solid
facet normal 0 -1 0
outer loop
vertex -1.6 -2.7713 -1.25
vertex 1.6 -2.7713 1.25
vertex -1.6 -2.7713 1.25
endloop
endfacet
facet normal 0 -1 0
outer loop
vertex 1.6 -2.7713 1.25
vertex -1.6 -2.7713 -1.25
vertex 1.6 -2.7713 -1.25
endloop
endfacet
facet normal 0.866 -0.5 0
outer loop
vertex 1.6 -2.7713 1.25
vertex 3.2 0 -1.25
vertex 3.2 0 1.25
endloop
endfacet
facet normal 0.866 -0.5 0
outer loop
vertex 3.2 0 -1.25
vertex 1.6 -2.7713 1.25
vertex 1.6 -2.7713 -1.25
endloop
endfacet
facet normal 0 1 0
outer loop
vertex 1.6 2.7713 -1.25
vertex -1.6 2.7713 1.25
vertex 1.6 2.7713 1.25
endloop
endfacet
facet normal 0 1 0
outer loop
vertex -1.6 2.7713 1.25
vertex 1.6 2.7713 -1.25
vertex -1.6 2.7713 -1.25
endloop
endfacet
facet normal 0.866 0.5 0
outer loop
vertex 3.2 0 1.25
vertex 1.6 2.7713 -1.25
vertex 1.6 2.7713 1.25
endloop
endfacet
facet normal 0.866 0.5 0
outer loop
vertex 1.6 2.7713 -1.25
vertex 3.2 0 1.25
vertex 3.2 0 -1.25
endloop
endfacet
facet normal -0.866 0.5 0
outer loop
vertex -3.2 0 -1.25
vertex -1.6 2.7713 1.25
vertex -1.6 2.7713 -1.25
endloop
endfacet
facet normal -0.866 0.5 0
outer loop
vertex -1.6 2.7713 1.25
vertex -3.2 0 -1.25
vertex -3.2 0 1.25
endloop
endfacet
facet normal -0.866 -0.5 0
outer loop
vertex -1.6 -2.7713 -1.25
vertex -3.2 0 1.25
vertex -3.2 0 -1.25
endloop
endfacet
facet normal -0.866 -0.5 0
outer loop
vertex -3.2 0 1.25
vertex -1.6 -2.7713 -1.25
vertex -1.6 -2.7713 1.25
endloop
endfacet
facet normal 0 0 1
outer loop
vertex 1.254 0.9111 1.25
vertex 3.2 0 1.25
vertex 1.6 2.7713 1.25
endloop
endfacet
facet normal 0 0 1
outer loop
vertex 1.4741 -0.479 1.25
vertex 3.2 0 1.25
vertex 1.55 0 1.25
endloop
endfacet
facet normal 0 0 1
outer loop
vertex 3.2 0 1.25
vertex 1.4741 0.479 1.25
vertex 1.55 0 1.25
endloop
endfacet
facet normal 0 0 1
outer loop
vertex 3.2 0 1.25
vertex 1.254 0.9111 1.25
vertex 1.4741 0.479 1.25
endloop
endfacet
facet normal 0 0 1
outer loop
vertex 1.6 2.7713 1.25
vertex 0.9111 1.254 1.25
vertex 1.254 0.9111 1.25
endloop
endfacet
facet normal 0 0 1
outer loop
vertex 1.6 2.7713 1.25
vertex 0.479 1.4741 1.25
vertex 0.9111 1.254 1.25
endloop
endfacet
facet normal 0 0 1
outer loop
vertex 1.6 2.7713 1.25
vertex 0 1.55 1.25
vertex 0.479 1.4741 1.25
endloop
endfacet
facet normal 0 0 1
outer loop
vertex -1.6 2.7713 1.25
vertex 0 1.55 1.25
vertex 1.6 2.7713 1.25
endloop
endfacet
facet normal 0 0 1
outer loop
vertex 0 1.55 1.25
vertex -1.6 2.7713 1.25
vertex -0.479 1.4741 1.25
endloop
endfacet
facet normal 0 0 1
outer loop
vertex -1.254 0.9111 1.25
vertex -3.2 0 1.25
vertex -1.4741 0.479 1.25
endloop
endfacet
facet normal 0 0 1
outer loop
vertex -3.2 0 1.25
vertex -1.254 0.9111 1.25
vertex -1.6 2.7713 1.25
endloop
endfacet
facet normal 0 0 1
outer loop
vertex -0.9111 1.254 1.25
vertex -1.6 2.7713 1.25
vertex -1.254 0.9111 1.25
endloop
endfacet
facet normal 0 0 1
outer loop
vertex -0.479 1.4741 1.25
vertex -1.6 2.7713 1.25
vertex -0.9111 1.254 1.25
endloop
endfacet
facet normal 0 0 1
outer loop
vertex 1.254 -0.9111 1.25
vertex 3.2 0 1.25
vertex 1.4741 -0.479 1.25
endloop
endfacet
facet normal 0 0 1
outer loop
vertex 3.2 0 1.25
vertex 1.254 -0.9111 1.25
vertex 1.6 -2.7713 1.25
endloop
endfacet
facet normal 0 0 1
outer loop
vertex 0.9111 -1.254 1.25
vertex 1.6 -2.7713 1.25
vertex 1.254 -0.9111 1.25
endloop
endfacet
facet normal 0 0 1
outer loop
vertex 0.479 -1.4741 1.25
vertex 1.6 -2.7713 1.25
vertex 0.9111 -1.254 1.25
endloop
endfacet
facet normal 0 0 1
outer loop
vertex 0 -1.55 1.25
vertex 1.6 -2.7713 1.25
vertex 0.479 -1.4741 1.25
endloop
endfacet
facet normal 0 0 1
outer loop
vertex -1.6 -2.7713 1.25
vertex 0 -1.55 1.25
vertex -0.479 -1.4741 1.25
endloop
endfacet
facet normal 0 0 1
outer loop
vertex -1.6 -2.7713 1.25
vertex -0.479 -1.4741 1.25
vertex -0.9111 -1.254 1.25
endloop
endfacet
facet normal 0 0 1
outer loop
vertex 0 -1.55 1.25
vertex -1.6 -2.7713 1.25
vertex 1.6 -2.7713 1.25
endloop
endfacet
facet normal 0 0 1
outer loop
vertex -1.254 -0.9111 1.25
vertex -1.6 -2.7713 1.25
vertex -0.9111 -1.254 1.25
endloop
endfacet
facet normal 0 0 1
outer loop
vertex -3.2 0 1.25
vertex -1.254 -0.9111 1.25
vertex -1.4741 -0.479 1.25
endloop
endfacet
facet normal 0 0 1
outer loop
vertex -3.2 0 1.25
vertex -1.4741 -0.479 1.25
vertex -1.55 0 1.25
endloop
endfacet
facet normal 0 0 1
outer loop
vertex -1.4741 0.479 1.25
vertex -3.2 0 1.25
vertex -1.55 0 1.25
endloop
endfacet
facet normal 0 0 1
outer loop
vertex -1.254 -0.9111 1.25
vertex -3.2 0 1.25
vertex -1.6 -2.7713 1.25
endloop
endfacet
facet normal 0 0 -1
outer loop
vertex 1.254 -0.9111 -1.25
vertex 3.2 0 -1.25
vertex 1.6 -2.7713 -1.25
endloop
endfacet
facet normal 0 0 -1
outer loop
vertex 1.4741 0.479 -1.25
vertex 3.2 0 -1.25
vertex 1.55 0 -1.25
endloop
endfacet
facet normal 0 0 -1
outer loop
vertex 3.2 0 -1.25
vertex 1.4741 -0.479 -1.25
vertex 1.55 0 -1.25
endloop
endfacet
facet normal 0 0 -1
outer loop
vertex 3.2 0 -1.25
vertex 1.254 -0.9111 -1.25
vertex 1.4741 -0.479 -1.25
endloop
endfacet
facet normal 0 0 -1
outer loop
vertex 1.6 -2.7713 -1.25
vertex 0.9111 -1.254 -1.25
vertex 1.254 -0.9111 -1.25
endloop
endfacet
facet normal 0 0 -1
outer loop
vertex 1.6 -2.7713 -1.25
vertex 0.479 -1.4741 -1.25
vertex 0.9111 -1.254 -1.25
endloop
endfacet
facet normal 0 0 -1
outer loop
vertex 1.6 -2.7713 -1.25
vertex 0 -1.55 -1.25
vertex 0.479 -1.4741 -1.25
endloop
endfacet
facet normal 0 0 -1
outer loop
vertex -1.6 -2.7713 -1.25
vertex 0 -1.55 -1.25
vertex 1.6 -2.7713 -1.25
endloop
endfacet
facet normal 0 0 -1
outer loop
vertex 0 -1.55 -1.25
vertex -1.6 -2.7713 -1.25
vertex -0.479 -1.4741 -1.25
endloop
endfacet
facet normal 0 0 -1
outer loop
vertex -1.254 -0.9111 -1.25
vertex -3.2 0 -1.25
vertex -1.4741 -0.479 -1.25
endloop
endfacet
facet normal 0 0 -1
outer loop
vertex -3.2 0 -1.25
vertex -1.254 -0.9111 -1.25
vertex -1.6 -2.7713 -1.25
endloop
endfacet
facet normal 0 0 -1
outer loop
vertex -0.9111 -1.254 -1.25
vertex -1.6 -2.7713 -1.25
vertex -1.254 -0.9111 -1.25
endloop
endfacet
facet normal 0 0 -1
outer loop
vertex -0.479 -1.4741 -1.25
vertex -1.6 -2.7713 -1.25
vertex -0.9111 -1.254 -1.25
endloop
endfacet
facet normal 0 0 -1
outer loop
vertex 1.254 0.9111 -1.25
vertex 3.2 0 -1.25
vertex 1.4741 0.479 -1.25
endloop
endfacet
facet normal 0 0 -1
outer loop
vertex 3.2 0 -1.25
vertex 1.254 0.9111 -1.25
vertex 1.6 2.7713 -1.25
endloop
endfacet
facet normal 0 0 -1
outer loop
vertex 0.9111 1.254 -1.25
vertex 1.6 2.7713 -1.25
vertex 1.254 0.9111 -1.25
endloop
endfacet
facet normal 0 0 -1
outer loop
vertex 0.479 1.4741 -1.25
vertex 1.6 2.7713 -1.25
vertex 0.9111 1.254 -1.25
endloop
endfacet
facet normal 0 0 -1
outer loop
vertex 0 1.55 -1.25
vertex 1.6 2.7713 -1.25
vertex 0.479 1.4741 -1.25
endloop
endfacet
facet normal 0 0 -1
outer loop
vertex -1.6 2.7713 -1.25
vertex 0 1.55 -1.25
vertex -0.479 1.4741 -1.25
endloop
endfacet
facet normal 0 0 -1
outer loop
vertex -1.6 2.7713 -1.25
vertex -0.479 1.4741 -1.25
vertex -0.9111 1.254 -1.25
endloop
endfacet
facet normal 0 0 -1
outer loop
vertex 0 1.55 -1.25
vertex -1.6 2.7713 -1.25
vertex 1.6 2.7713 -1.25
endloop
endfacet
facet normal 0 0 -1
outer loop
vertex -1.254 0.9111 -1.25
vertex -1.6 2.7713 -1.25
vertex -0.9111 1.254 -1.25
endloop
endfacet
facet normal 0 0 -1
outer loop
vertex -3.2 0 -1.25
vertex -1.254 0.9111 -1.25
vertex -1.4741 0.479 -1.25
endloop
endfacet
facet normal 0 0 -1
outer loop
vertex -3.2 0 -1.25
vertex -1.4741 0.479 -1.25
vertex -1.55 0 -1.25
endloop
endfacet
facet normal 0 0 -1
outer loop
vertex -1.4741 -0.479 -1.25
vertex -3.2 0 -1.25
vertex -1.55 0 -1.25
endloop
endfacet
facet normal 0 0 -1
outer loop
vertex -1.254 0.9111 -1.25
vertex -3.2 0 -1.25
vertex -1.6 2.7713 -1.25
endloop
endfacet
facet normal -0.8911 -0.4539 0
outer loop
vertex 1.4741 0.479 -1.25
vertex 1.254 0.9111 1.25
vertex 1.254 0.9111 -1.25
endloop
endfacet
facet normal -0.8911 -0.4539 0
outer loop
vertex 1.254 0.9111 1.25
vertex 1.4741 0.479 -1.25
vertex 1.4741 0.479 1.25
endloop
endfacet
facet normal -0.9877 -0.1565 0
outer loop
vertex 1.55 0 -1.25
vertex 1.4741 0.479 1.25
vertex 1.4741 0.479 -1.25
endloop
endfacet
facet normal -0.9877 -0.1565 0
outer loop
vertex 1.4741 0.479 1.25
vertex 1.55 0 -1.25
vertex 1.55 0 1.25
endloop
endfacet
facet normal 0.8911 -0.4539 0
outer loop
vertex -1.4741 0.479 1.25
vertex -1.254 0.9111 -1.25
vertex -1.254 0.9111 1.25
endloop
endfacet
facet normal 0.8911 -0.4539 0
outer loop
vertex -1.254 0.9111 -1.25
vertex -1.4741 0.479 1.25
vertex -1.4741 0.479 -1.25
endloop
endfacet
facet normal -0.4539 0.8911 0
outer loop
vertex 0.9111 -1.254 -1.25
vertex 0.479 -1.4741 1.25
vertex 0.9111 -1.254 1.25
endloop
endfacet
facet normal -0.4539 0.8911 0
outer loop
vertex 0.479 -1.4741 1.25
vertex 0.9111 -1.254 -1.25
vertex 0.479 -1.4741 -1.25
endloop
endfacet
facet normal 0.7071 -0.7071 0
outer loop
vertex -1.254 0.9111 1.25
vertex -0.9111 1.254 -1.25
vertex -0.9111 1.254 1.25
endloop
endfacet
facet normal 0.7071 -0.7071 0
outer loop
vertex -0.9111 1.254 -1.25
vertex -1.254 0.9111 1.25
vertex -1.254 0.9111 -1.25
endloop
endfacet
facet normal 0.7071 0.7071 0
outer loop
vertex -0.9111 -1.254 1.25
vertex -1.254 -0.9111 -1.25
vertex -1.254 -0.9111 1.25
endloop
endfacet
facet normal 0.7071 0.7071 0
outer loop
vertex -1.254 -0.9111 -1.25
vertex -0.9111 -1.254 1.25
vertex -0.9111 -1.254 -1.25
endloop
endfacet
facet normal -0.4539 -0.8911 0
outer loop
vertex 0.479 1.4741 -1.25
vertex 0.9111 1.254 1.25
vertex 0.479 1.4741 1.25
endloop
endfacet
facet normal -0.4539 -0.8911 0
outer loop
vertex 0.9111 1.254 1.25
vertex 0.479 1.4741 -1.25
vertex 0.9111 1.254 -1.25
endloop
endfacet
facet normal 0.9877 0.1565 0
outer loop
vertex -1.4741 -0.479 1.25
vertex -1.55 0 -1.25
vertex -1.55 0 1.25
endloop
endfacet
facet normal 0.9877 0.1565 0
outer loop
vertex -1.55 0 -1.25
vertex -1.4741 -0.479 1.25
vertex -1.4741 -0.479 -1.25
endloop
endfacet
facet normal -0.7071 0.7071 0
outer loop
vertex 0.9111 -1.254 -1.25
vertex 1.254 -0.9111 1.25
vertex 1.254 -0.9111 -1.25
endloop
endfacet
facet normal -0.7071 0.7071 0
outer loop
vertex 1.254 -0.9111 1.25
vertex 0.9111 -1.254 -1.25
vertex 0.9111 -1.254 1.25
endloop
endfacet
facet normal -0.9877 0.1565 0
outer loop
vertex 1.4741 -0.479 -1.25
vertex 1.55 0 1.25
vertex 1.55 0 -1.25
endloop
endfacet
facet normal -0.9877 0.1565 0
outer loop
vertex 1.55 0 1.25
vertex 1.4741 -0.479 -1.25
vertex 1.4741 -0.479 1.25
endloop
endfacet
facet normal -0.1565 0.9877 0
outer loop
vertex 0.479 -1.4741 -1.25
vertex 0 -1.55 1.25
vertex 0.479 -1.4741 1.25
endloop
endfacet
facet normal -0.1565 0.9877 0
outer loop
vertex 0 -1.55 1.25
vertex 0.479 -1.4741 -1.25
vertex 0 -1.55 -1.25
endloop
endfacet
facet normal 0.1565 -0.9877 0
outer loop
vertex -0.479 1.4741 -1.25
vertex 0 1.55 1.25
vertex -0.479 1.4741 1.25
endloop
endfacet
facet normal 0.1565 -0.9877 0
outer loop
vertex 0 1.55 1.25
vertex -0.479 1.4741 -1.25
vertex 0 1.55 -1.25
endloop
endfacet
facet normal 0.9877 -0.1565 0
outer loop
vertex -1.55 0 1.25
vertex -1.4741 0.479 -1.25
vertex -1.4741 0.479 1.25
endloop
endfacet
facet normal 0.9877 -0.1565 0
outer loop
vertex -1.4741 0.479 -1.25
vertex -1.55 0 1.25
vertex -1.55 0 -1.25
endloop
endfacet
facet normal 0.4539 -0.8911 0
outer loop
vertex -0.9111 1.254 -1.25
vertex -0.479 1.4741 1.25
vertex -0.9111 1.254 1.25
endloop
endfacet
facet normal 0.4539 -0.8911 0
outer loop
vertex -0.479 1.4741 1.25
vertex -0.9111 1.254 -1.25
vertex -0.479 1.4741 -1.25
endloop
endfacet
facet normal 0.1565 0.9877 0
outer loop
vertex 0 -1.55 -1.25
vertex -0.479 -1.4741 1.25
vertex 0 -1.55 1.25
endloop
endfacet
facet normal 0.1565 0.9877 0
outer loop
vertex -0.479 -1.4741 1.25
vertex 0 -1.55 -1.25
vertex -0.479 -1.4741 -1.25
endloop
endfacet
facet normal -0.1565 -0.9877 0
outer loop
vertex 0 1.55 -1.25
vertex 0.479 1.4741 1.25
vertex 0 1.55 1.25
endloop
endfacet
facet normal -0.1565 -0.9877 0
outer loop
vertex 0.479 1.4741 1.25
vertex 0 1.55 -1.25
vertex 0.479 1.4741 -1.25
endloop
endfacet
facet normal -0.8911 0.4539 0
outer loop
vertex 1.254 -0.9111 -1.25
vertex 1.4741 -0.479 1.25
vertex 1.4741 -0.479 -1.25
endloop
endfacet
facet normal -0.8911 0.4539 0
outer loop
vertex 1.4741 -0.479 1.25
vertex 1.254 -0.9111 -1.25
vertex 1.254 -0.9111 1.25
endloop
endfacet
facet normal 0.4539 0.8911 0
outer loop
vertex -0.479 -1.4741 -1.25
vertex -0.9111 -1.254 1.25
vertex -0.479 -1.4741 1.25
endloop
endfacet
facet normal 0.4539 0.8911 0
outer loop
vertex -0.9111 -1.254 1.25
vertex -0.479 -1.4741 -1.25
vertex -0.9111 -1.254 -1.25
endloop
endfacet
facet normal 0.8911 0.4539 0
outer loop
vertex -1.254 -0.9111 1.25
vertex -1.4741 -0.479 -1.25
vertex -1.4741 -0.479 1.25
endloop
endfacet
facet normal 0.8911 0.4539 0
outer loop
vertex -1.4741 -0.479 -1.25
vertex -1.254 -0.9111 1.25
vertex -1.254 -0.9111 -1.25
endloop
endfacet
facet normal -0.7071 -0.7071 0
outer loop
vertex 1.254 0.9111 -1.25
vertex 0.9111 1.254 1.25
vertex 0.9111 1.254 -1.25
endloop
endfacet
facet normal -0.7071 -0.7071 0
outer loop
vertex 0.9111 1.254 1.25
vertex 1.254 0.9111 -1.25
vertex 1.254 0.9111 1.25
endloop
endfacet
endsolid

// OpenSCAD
//-- Nut
  nut_h = 2.5;
  nut_radius = 6.4/2;
  nut_drill = 3.1;

difference() {
  cylinder(r=nut_radius, h = nut_h, $fn=6,center=true);
  cylinder(r=nut_drill/2, h=10,center=true, $fn=20);
}
